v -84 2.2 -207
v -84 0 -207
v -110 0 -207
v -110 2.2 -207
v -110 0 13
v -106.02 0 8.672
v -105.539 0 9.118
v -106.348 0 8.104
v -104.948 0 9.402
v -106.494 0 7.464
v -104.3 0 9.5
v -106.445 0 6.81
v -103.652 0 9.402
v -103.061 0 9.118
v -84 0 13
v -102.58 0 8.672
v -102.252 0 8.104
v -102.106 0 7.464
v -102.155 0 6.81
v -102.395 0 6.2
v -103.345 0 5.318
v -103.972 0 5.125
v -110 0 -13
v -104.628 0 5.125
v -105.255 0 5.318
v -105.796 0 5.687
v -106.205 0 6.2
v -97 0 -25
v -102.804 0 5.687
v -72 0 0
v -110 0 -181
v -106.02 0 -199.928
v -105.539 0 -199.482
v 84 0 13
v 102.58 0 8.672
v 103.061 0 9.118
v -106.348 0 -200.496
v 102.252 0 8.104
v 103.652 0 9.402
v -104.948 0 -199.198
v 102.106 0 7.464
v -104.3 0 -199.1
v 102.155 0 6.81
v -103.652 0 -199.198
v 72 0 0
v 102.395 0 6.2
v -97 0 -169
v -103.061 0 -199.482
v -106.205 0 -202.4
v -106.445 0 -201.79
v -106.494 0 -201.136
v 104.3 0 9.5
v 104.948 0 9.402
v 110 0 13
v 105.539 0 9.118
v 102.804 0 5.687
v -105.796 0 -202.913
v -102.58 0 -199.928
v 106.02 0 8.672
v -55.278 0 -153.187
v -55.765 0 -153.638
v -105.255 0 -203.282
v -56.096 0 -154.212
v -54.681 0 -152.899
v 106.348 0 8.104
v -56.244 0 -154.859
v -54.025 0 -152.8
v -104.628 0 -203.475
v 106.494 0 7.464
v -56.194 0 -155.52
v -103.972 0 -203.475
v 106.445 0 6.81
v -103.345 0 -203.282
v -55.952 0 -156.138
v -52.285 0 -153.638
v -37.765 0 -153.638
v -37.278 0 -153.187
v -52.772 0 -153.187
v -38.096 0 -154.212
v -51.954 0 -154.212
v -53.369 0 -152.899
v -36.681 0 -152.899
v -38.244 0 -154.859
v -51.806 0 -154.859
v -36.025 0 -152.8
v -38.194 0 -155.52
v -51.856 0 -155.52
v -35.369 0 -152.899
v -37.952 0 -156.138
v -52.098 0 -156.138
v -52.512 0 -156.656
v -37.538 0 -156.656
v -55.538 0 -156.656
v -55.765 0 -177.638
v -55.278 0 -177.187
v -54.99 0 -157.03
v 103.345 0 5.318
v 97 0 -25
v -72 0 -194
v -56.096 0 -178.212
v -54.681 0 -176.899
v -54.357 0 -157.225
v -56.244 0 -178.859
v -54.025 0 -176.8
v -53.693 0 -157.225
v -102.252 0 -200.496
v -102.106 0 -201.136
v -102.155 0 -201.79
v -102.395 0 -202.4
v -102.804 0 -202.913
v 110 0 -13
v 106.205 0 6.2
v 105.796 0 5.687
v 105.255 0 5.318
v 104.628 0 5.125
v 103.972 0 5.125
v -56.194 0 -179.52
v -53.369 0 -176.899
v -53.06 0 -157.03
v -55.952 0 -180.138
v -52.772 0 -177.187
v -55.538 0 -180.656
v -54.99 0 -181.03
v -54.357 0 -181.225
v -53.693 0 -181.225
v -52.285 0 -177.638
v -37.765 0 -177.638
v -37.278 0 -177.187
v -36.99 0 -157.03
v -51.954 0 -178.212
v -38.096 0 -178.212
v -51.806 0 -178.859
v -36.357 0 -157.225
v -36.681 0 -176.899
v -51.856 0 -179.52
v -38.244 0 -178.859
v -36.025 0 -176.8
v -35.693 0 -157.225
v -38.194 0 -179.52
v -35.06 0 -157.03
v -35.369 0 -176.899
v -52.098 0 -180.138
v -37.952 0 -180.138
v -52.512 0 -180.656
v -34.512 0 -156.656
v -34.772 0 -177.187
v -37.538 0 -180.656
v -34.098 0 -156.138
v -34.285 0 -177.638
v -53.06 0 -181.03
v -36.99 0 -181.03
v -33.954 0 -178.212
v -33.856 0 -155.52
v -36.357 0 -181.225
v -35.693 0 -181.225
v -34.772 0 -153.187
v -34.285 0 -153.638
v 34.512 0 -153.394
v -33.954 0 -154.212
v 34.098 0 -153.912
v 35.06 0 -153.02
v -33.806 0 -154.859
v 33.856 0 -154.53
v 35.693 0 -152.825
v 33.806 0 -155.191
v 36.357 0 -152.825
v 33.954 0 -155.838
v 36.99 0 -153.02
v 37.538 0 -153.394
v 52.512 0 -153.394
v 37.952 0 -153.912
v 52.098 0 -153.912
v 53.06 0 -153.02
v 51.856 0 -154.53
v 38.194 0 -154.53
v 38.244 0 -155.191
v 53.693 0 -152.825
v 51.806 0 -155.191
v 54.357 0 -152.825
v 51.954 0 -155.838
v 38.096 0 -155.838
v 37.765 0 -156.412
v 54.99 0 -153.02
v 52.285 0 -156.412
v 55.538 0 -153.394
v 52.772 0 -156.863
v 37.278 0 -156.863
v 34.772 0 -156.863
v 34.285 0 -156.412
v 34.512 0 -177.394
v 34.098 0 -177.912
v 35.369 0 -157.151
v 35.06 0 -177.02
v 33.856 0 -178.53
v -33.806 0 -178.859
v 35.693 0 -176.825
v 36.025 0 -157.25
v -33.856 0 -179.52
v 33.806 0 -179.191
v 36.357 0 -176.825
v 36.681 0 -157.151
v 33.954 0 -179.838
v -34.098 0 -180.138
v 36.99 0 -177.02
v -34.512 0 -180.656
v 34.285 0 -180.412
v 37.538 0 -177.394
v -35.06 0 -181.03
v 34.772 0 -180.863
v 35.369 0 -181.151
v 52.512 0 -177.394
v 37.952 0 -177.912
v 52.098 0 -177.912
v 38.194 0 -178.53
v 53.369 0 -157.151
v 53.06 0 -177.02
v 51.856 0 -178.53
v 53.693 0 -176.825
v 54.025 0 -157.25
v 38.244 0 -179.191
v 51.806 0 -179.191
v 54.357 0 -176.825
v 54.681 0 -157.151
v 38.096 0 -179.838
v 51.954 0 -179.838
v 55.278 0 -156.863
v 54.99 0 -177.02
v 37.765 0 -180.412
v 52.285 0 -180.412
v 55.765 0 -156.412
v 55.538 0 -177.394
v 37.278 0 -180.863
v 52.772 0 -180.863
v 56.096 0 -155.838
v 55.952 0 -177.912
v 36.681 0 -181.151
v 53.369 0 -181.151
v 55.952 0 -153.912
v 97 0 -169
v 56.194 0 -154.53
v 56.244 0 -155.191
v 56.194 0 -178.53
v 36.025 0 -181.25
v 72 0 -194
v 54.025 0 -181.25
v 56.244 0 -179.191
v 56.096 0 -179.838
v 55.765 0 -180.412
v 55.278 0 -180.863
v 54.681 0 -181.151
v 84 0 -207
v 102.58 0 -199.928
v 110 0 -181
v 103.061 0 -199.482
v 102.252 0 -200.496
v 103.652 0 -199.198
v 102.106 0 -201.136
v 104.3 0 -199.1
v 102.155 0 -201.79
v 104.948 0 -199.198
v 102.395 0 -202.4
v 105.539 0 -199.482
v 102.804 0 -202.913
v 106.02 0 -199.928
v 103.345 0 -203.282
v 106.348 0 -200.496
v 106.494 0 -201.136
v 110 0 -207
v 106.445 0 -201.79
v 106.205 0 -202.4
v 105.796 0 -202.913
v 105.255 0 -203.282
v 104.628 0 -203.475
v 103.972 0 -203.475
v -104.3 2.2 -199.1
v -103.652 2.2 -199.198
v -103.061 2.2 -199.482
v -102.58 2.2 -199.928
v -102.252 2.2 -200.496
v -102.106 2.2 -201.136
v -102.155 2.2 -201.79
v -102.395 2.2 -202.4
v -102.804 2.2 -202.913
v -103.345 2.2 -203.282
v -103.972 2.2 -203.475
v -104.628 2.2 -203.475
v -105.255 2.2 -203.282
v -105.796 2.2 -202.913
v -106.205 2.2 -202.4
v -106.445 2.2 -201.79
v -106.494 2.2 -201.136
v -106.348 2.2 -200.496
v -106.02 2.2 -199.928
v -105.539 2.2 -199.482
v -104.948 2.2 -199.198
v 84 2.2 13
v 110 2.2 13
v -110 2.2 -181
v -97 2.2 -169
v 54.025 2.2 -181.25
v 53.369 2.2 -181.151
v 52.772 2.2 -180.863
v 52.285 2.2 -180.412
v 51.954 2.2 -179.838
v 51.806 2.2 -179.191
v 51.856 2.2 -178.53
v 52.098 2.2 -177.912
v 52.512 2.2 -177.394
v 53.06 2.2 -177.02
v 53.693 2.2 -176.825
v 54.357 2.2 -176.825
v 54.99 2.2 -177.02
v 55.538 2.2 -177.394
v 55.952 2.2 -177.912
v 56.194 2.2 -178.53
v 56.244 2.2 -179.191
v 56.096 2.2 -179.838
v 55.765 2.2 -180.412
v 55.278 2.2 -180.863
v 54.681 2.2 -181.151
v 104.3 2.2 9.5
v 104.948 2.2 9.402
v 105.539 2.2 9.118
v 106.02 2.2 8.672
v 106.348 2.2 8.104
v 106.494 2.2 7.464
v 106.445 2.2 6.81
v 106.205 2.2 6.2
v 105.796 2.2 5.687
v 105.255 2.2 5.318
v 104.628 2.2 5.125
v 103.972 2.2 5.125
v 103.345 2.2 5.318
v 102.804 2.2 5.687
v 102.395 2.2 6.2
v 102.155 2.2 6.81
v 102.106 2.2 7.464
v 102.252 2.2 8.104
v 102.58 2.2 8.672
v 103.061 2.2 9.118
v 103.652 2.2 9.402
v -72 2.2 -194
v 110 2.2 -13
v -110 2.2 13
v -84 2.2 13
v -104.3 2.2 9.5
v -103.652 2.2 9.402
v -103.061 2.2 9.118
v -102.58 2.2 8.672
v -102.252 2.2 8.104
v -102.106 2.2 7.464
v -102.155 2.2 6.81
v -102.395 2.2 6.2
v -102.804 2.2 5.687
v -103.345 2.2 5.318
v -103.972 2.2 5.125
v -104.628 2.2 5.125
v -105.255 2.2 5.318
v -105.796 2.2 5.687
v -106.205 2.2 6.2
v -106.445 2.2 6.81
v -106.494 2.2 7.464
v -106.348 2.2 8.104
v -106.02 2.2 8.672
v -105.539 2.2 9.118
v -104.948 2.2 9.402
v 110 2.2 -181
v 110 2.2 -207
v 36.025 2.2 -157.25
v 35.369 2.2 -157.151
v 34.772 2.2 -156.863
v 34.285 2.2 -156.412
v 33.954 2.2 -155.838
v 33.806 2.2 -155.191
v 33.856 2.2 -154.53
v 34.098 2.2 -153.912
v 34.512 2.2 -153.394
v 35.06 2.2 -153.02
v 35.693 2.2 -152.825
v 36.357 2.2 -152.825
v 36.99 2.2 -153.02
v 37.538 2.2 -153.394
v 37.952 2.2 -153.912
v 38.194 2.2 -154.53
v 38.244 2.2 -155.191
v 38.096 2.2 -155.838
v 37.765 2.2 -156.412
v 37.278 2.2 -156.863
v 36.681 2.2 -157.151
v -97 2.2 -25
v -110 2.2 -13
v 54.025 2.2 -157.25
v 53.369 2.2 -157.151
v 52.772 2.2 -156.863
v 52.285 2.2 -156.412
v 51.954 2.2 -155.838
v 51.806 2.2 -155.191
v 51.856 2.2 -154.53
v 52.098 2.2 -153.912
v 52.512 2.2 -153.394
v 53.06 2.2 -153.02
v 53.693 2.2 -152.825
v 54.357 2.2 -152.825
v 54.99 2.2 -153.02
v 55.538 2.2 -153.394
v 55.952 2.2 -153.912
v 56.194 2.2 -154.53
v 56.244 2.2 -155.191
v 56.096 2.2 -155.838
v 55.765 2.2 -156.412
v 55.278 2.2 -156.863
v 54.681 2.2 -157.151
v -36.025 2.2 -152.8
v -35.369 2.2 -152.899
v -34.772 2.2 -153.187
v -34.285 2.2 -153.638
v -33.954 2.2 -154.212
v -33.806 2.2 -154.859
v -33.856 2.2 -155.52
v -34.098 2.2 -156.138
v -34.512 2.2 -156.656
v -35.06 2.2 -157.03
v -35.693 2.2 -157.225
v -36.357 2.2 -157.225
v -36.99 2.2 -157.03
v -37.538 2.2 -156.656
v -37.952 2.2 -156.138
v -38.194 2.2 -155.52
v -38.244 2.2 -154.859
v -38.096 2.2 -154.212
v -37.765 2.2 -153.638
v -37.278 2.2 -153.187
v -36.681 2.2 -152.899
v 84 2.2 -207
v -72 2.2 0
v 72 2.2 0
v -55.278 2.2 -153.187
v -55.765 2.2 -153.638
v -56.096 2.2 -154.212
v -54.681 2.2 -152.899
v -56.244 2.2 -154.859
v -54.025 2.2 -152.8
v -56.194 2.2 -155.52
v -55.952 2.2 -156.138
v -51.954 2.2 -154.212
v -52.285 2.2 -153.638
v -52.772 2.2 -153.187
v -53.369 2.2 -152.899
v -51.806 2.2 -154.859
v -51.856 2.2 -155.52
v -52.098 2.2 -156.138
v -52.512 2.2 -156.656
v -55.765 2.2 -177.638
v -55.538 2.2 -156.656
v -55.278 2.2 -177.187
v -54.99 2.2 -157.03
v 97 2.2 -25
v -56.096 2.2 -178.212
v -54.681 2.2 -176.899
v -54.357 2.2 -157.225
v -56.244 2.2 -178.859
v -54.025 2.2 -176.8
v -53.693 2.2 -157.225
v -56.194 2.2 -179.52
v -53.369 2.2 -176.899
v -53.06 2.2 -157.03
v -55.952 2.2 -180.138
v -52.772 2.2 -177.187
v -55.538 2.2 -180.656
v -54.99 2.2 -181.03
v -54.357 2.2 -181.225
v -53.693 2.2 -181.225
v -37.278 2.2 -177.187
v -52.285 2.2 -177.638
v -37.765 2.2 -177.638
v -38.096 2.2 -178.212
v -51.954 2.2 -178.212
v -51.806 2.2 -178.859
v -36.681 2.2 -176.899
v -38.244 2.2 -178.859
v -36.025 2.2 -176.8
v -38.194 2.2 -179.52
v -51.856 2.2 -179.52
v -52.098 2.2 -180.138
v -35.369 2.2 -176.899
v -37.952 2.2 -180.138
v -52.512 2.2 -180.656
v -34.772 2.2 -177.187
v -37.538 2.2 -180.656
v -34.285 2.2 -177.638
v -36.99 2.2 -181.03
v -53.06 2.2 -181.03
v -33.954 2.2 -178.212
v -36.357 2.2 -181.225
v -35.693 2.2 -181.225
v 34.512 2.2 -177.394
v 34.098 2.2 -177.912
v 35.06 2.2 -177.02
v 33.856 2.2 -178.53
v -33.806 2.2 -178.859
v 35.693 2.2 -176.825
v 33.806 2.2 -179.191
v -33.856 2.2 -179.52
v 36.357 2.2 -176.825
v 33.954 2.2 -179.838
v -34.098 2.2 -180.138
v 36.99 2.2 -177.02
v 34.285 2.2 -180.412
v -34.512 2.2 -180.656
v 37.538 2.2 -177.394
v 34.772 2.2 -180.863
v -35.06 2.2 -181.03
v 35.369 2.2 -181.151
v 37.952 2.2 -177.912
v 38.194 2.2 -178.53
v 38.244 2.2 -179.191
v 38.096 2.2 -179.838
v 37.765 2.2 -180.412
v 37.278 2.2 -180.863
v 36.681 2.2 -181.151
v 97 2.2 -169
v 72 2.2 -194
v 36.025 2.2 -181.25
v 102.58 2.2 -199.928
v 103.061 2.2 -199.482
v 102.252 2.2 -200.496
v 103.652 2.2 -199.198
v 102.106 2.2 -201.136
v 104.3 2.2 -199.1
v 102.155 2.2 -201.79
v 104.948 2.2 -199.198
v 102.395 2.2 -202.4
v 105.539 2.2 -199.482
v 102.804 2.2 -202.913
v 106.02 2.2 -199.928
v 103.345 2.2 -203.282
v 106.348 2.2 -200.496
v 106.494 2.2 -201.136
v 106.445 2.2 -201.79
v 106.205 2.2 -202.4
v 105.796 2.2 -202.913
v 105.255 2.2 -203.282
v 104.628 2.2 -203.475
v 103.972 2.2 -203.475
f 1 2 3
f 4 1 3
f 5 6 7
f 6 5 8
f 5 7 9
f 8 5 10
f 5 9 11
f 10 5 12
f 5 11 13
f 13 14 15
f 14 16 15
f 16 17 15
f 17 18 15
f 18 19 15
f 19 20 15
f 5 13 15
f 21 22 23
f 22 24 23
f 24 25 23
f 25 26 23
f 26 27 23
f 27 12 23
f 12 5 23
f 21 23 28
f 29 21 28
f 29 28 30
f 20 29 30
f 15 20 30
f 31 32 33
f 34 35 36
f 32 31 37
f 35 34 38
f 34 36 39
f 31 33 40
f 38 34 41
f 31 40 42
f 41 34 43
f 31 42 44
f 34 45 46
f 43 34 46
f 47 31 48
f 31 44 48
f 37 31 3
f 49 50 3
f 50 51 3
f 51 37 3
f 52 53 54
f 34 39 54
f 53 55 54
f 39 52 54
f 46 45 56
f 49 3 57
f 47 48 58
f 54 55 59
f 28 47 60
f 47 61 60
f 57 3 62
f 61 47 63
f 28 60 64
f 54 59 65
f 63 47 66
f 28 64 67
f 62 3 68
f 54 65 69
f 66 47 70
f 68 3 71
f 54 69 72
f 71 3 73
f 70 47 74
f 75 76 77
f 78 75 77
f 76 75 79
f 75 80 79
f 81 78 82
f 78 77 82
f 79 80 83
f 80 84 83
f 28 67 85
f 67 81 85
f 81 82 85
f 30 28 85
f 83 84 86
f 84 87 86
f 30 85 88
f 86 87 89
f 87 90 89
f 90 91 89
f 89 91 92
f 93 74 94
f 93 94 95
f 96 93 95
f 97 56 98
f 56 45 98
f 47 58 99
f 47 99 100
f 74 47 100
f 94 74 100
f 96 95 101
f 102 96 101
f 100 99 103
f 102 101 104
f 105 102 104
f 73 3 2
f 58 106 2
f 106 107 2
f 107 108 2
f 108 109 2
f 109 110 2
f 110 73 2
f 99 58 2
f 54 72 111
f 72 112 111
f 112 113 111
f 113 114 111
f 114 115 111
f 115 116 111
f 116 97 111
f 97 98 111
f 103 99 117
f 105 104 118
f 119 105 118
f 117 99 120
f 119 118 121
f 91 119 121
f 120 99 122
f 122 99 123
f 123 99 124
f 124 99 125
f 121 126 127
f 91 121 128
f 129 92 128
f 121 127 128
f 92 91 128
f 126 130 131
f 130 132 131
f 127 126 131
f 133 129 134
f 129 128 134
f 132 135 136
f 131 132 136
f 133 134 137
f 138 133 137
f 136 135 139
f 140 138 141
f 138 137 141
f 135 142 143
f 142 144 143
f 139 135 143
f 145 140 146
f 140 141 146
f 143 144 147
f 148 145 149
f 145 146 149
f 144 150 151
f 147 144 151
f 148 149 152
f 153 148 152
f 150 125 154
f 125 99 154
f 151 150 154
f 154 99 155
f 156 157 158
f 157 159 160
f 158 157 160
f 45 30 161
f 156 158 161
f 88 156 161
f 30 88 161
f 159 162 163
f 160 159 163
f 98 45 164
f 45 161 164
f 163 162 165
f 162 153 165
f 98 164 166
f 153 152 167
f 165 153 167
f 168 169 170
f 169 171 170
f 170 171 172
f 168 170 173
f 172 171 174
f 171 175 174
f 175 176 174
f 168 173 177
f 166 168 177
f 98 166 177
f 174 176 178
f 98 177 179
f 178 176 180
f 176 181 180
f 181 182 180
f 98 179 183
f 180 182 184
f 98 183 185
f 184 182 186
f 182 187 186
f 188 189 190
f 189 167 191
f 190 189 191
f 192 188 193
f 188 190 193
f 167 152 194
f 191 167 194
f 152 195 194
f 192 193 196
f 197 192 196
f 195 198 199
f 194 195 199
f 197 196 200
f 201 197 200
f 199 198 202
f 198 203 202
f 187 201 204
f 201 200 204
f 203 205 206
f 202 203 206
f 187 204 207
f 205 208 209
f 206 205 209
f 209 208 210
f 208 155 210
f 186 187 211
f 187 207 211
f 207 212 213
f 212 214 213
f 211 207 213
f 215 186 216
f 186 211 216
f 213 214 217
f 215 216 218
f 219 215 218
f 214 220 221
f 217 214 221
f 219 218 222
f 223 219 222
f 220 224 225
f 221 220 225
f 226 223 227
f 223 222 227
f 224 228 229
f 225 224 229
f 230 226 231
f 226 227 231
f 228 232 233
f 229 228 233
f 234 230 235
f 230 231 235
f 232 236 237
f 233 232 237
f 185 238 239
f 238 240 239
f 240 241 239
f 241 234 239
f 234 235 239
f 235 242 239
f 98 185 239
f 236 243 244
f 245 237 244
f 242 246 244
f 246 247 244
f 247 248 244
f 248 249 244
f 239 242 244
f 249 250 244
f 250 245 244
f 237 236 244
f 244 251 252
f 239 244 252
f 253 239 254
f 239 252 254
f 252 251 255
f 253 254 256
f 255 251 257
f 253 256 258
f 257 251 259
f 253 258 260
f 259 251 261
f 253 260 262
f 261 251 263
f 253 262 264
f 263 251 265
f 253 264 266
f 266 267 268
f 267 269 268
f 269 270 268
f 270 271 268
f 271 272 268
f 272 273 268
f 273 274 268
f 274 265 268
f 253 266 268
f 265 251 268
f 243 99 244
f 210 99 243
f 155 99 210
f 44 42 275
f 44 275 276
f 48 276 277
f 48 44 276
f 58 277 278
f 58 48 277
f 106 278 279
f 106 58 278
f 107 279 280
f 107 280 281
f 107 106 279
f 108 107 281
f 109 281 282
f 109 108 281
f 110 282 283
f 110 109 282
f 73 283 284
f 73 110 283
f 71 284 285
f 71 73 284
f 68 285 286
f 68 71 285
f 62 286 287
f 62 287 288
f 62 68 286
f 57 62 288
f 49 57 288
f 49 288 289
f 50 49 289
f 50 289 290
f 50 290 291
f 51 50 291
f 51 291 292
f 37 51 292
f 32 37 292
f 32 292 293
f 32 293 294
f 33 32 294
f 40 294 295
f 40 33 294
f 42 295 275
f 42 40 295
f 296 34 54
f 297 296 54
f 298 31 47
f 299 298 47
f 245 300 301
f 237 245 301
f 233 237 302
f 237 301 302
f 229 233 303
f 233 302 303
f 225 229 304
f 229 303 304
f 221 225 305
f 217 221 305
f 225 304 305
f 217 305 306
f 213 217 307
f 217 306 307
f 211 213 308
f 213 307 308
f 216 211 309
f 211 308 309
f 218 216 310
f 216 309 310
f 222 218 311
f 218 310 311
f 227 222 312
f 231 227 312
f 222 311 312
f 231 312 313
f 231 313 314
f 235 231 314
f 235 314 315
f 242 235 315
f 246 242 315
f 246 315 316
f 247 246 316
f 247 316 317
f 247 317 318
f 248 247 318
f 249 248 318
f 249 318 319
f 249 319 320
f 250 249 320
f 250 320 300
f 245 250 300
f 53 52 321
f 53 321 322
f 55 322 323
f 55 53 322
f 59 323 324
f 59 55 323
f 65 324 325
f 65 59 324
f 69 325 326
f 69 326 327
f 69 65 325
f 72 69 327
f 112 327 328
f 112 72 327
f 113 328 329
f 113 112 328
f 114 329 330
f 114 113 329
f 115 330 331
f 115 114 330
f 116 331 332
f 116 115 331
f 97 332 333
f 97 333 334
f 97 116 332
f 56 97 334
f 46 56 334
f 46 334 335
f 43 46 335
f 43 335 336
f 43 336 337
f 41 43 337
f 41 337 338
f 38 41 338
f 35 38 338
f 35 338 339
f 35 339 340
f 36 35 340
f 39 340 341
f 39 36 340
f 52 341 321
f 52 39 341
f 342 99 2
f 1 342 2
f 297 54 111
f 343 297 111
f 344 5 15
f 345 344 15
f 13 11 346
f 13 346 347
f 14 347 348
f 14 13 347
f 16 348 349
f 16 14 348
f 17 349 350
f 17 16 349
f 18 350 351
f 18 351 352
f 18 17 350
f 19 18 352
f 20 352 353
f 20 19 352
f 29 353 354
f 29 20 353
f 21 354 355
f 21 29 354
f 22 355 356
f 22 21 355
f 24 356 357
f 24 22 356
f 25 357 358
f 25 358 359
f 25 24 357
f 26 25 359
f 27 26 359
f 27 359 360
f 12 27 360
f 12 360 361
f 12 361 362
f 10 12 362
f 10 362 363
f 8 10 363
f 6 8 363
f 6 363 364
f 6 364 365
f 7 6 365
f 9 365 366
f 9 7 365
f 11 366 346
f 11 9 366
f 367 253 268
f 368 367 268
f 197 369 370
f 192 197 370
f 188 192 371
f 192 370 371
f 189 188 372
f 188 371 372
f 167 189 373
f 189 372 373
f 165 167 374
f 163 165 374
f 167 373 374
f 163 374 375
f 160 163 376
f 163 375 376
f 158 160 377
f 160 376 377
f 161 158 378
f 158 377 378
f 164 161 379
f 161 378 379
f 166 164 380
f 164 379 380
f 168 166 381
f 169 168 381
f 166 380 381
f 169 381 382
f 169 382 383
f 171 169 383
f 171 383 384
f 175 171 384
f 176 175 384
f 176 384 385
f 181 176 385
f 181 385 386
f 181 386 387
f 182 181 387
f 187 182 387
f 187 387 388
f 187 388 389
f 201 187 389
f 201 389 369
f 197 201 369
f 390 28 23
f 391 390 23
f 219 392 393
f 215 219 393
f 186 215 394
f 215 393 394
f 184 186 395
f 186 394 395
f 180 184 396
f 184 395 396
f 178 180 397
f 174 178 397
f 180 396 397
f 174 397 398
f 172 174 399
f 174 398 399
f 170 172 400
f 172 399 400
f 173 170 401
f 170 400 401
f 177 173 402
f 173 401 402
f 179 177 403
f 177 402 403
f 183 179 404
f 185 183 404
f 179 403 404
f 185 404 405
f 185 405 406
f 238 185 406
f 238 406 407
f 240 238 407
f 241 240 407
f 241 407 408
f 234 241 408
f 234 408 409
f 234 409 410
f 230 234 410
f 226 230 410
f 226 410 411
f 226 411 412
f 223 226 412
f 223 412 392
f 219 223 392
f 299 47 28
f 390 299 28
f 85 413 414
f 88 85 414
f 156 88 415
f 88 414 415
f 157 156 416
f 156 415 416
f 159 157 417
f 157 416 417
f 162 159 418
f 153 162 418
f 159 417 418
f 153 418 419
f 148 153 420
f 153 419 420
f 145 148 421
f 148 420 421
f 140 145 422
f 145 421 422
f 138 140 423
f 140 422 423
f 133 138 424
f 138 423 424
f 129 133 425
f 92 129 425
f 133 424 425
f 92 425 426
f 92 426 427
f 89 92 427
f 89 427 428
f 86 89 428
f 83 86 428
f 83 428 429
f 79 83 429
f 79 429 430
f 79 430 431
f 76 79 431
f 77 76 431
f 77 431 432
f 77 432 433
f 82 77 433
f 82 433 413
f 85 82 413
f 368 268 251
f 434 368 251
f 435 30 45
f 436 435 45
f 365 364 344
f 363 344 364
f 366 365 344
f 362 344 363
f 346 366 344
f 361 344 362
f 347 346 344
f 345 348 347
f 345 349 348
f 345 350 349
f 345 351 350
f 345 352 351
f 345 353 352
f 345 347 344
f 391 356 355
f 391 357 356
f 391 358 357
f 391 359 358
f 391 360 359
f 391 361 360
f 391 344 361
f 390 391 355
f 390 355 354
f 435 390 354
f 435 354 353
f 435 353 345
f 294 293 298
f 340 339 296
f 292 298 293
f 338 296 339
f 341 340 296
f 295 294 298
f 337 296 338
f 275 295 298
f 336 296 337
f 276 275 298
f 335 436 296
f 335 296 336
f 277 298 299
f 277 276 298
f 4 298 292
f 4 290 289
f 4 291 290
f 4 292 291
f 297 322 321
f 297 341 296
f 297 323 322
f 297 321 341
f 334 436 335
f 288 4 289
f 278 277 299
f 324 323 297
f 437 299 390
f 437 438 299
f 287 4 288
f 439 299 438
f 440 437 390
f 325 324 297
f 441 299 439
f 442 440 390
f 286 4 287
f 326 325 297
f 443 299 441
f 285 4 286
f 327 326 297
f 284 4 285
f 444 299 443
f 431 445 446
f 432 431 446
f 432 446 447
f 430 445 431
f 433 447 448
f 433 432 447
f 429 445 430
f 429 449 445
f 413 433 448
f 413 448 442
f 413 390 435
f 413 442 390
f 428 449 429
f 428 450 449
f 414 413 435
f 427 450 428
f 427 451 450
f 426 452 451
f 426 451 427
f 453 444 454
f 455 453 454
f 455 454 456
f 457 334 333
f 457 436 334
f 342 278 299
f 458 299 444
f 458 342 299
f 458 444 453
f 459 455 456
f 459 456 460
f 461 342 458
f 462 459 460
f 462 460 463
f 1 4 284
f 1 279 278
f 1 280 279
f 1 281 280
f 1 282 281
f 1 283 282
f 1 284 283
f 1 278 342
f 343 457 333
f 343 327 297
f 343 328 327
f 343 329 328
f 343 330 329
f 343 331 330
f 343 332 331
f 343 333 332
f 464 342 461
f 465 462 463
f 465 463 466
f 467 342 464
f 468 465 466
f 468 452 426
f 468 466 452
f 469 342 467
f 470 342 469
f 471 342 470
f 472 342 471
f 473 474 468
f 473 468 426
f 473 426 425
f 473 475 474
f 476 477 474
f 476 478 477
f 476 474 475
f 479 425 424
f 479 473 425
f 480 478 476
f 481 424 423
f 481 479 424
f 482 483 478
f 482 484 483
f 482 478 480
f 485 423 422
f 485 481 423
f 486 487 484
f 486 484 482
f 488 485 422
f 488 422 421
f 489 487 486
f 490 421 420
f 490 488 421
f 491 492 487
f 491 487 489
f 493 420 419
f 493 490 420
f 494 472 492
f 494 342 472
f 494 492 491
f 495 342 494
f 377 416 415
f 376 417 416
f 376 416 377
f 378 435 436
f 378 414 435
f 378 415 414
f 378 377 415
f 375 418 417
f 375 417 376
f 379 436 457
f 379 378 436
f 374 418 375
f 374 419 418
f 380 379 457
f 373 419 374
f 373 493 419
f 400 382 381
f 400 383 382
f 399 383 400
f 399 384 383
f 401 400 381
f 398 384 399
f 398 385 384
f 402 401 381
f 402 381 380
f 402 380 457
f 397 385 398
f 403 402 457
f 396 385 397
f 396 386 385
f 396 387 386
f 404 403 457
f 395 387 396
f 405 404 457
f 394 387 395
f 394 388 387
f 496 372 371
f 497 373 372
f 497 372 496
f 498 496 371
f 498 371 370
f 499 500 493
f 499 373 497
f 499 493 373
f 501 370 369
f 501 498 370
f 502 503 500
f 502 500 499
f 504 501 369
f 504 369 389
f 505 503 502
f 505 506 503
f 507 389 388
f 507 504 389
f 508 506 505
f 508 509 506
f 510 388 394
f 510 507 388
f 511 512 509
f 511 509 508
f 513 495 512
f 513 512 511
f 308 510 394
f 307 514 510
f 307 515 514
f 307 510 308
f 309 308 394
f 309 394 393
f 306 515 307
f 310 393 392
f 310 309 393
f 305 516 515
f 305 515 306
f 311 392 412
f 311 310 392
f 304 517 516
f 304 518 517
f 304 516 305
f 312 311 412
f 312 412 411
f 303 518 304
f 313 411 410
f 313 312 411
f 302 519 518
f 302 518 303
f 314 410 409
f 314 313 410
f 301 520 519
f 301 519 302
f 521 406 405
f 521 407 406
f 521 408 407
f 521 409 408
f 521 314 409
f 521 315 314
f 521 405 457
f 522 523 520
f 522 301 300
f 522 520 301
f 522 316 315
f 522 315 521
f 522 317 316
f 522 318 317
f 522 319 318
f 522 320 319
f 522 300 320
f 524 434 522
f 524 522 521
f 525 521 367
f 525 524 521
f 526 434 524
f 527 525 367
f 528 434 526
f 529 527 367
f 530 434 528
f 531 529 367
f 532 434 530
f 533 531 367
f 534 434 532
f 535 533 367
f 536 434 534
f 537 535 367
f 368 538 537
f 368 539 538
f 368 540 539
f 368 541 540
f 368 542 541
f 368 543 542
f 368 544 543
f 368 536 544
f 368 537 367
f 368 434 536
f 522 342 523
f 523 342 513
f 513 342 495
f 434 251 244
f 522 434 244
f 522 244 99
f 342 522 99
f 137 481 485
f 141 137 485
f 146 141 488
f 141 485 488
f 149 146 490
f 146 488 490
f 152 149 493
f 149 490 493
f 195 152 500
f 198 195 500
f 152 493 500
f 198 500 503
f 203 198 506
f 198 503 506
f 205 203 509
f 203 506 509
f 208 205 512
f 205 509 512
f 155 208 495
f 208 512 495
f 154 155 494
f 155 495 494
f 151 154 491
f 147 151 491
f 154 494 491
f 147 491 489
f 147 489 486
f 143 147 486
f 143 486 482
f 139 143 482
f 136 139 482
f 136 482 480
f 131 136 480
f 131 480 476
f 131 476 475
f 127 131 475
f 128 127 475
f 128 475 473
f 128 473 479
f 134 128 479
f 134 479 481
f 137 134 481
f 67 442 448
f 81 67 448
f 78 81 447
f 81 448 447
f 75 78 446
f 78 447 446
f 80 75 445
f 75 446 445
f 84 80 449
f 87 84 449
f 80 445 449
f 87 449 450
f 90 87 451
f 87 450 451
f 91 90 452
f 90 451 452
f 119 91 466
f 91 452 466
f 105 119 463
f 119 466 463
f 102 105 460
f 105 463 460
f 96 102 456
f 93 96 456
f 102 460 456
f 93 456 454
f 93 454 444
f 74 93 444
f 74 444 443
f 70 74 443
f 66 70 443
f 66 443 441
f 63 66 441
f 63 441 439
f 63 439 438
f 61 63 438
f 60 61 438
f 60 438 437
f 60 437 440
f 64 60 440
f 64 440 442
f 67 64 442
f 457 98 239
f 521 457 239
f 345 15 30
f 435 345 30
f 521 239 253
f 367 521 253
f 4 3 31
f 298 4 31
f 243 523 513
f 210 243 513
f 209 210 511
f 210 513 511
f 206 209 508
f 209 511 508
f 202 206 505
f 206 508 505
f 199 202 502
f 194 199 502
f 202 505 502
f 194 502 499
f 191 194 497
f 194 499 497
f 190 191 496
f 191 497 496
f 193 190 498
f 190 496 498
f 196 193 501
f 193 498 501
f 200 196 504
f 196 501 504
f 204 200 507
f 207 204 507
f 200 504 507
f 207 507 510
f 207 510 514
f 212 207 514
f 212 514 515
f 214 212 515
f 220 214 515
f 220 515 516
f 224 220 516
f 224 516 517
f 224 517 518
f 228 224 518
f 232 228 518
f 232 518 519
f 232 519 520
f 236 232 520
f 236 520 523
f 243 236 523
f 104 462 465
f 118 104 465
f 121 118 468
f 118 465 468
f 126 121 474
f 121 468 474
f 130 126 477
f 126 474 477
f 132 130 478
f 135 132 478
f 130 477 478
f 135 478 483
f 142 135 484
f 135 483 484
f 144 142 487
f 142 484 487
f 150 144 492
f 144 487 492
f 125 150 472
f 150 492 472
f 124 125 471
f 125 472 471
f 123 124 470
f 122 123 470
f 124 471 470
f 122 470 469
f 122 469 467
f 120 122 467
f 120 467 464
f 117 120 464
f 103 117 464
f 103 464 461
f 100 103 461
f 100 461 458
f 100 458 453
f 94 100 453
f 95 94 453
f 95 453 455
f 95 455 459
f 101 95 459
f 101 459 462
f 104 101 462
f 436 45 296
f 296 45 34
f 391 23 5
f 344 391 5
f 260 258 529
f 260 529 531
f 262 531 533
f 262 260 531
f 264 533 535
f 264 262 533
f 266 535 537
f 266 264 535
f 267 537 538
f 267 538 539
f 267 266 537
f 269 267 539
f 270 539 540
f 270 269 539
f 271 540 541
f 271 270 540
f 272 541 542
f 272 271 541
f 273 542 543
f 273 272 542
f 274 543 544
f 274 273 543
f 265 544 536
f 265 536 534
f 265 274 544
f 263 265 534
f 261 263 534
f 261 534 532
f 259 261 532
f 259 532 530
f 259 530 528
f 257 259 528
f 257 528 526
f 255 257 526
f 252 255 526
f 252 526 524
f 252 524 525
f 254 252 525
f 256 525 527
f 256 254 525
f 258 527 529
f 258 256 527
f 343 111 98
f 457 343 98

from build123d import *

# Parameters (mm, degrees)
SKETCH1_R           = 2.2
BOSS_EXTRUDE1_DEPTH = 2.2
SKETCH2_R           = 2.225
CUT_EXTRUDE1_DEPTH  = 235.422353883


with BuildPart() as part:
    # Sketch1 → Boss-Extrude1 (new body)
    with BuildSketch(Plane(origin=(0, 0, 0), x_dir=(1, 0, 0), z_dir=(0, 1, 0))):
        Polygon((84, 207), (72, 194), (0, 194), (-72, 194), (-84, 207), (-110, 207), (-110, 181), (-97, 169), (-97, 97), (-97, 25), (-110, 13), (-110, -13), (-84, -13), (-72, 0), (0, 0), (72, 0), (84, -13), (110, -13), (110, 13), (97, 25), (97, 97), (97, 169), (110, 181), (110, 207), align=None)
        with Locations(Location((104.3, 201.3, 0), (0, 0, 270))):
            Circle(SKETCH1_R, mode=Mode.SUBTRACT)
        with Locations(Location((-104.3, 201.3, 0), (0, 0, 270))):
            Circle(SKETCH1_R, mode=Mode.SUBTRACT)
        with Locations(Location((-104.3, -7.3, 0), (0, 0, 270))):
            Circle(SKETCH1_R, mode=Mode.SUBTRACT)
        with Locations(Location((104.3, -7.3, 0), (0, 0, 270))):
            Circle(SKETCH1_R, mode=Mode.SUBTRACT)
    extrude(amount=BOSS_EXTRUDE1_DEPTH)

    # Sketch2 → Cut-Extrude1 (cut, through all)
    with BuildSketch(Plane(origin=(0, 2.2, 0), x_dir=(1, 0, 0), z_dir=(0, 1, 0))):
        with Locations(Location((-54.025, 179.025, 0), (0, 0, 270))):
            Circle(SKETCH2_R)
        with Locations(Location((-36.025, 179.025, 0), (0, 0, 270))):
            Circle(SKETCH2_R)
        with Locations(Location((-54.025, 155.025, 0), (0, 0, 270))):
            Circle(SKETCH2_R)
        with Locations(Location((-36.025, 155.025, 0), (0, 0, 270))):
            Circle(SKETCH2_R)
        with Locations(Location((36.025, 155.025, 0), (0, 0, 90))):
            Circle(SKETCH2_R)
        with Locations(Location((54.025, 155.025, 0), (0, 0, 90))):
            Circle(SKETCH2_R)
        with Locations(Location((36.025, 179.025, 0), (0, 0, 90))):
            Circle(SKETCH2_R)
        with Locations(Location((54.025, 179.025, 0), (0, 0, 90))):
            Circle(SKETCH2_R)
    extrude(amount=-CUT_EXTRUDE1_DEPTH, mode=Mode.SUBTRACT)


solid = part.part
